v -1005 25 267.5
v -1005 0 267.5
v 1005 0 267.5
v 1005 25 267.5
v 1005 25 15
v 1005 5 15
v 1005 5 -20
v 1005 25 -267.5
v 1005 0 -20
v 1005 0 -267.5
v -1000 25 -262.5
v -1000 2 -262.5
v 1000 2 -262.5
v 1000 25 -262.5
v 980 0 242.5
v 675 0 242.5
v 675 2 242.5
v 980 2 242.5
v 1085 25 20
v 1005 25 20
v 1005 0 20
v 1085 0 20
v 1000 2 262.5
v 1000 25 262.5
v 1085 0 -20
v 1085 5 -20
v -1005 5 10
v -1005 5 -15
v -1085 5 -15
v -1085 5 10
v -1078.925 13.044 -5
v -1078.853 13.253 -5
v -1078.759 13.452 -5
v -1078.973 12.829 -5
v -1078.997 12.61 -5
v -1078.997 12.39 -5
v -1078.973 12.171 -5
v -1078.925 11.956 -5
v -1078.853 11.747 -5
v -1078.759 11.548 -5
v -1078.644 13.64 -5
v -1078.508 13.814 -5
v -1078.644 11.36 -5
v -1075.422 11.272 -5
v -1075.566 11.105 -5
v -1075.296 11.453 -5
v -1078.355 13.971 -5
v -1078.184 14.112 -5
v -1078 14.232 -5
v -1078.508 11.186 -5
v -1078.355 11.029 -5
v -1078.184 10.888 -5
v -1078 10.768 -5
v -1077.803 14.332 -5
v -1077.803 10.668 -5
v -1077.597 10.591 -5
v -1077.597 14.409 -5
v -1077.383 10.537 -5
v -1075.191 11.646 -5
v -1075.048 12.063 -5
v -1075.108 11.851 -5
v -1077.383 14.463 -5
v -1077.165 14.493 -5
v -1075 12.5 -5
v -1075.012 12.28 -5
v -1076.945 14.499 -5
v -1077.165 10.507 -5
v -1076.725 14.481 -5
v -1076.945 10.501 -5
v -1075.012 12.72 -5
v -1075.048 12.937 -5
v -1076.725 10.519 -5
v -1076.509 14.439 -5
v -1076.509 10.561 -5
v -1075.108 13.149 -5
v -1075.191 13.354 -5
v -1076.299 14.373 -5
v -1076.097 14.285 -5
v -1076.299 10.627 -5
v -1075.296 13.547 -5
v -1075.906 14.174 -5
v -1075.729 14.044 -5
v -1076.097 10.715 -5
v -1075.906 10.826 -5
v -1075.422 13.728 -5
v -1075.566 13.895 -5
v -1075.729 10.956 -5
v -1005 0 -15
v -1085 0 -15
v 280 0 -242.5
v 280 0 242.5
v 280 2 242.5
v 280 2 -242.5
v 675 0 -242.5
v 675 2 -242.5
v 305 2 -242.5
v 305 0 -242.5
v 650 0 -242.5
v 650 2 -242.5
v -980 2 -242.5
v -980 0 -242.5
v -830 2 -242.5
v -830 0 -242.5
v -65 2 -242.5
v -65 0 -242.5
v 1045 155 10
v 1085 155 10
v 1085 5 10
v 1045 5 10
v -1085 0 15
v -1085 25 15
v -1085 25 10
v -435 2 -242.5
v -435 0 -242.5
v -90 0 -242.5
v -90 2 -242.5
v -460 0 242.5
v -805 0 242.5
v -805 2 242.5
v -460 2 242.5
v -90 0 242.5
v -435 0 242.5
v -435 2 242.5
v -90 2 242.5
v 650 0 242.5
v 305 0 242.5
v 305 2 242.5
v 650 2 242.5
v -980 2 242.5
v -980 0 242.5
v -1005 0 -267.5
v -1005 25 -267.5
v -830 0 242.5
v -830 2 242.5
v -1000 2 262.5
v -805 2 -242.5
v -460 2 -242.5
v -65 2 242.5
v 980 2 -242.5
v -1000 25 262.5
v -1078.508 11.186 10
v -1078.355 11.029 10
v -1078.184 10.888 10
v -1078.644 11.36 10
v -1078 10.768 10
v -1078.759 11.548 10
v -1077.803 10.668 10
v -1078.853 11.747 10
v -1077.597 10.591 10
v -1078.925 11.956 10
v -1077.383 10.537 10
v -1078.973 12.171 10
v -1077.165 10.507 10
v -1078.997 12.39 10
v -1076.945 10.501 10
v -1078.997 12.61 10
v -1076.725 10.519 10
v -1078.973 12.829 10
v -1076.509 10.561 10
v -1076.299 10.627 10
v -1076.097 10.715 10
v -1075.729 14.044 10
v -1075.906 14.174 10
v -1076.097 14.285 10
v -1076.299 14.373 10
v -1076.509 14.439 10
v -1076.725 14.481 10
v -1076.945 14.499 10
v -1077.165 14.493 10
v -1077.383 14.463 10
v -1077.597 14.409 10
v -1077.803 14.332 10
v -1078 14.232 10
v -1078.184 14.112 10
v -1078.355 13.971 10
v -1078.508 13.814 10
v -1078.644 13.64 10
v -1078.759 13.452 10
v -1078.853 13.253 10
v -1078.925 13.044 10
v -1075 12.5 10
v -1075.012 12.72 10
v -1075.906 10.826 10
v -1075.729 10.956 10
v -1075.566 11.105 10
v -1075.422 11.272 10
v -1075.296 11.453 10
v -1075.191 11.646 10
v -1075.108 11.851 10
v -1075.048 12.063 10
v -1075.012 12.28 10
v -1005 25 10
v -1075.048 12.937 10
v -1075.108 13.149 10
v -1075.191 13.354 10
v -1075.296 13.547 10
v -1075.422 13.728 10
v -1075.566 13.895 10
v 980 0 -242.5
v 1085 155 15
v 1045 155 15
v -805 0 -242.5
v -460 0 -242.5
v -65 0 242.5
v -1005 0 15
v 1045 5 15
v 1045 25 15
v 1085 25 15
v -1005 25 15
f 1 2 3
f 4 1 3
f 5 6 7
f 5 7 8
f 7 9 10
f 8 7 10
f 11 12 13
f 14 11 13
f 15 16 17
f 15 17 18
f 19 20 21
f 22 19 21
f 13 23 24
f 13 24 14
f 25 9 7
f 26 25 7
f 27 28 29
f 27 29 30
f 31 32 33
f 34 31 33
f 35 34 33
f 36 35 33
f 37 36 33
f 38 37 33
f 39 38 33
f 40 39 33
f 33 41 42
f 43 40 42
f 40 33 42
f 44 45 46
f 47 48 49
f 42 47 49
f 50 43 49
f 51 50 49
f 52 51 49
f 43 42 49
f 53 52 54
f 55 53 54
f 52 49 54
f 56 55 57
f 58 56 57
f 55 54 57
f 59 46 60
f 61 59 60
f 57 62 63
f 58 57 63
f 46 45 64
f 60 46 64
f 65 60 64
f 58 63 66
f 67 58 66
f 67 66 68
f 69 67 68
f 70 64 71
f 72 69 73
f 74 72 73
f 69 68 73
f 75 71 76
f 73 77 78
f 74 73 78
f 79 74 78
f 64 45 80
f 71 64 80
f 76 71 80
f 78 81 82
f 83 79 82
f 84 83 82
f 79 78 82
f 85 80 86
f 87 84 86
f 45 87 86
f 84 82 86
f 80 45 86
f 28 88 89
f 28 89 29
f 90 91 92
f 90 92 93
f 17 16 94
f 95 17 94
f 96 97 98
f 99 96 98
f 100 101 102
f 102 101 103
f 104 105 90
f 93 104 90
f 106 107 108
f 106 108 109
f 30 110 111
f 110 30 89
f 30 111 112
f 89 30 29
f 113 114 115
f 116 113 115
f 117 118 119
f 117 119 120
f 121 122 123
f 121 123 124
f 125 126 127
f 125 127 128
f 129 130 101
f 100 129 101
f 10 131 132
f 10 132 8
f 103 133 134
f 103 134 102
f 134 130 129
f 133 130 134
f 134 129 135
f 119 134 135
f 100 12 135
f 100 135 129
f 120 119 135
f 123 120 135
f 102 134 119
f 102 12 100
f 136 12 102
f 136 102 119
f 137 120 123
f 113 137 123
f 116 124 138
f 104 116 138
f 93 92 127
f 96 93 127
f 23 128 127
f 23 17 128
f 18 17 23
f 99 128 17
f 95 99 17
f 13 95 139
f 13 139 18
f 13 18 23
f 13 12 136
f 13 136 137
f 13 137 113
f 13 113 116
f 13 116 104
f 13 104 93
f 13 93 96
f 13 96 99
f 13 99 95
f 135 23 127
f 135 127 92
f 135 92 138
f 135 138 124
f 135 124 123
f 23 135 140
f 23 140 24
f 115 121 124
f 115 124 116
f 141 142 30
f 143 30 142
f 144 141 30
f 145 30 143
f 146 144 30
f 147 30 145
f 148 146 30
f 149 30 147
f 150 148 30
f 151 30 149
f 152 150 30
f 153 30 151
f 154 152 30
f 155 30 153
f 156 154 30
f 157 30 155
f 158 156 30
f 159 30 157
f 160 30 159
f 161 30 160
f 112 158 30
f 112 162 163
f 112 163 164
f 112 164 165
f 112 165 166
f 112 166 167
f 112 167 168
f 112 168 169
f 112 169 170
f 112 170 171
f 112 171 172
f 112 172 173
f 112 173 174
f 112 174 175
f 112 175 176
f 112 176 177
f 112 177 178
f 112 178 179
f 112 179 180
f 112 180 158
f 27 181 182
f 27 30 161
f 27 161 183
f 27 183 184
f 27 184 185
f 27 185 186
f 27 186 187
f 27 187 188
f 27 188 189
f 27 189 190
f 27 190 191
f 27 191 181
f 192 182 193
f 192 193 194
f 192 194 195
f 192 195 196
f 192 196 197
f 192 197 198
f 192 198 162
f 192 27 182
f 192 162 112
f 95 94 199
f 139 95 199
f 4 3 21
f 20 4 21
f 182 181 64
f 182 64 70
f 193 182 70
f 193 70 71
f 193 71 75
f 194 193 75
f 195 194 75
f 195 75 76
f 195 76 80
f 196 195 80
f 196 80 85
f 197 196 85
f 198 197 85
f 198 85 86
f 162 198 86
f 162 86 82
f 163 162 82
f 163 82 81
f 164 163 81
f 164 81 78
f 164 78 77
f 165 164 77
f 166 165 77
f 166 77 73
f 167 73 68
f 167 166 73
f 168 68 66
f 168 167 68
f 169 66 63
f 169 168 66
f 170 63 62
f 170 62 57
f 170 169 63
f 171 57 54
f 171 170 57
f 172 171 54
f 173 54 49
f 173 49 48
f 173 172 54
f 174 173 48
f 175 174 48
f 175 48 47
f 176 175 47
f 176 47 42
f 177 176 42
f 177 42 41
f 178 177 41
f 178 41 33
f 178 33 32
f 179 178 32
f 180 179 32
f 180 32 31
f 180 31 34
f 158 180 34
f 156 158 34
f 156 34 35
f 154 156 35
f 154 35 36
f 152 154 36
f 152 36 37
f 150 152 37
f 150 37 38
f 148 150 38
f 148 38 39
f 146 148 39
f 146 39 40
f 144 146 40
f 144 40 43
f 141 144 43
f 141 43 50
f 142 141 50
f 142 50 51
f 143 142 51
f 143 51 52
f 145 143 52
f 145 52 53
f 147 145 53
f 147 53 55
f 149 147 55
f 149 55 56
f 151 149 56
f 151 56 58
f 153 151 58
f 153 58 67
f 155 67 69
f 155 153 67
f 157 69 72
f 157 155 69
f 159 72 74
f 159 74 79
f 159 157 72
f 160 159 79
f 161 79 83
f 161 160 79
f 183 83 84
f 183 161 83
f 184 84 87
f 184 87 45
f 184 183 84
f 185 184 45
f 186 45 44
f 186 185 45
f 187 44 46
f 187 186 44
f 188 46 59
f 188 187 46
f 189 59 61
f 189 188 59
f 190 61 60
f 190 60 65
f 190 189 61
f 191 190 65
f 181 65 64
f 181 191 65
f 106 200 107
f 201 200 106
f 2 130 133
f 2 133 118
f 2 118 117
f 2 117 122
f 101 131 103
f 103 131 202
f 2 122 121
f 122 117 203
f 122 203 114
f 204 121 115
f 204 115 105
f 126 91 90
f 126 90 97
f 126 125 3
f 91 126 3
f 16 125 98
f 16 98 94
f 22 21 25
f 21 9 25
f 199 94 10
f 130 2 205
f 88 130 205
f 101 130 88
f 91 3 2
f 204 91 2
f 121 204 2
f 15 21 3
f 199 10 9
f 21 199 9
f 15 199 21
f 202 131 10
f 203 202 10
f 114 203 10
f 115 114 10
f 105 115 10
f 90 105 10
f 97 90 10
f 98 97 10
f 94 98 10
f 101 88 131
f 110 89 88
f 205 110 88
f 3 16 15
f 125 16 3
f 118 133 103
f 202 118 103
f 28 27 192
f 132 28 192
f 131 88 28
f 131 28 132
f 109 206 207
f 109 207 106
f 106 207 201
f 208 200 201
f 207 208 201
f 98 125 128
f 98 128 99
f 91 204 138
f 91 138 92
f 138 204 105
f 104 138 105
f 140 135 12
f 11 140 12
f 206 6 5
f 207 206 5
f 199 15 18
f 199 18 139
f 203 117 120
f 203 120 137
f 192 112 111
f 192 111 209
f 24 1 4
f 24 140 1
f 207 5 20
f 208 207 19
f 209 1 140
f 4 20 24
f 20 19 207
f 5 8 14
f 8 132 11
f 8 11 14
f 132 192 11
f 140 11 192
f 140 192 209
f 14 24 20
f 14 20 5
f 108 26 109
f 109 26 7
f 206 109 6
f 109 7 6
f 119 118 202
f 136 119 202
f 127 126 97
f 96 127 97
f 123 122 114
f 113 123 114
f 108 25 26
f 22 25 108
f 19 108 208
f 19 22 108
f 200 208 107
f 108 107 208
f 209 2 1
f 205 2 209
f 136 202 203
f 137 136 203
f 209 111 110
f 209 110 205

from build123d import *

# Parameters (mm, degrees)
SKETCH1_W           = 150
SKETCH1_H           = 485
SKETCH1_W_2         = 345
SKETCH1_W_3         = 305
BOSS_EXTRUDE1_DEPTH = 2
SKETCH2_W           = 2010
SKETCH2_H           = 535
SKETCH2_W_2         = 2000
SKETCH2_H_2         = 525
BOSS_EXTRUDE2_DEPTH = 25
BOSS_EXTRUDE3_DEPTH = 80
SKETCH4_W           = 40
SKETCH4_H           = 150
BOSS_EXTRUDE4_DEPTH = 5
BOSS_EXTRUDE5_DEPTH = 80
SKETCH8_R           = 2
BOSS_EXTRUDE7_DEPTH = 20


with BuildPart() as part:
    # Sketch1 → Boss-Extrude1 (new body)
    with BuildSketch(Plane(origin=(0, 0, 0), x_dir=(1, 0, 0), z_dir=(0, 1, 0))):
        Polygon((1000, -262.5), (1000, 242.5), (1000, 262.5), (-1000, 262.5), (-1000, -262.5), align=None)
        with Locations((-905, 0)):
            Rectangle(SKETCH1_W, SKETCH1_H, mode=Mode.SUBTRACT)
        with Locations((-632.5, 0)):
            Rectangle(SKETCH1_W_2, SKETCH1_H, mode=Mode.SUBTRACT)
        with Locations((-262.5, 0)):
            Rectangle(SKETCH1_W_2, SKETCH1_H, mode=Mode.SUBTRACT)
        with Locations((107.5, 0)):
            Rectangle(SKETCH1_W_2, SKETCH1_H, mode=Mode.SUBTRACT)
        with Locations((827.5, 0)):
            Rectangle(SKETCH1_W_3, SKETCH1_H, mode=Mode.SUBTRACT)
        with Locations((477.5, 0)):
            Rectangle(SKETCH1_W_2, SKETCH1_H, mode=Mode.SUBTRACT)
    extrude(amount=BOSS_EXTRUDE1_DEPTH)

    # Sketch2 → Boss-Extrude2 (add)
    with BuildSketch(Plane(origin=(0, 0, 0), x_dir=(1, 0, 0), z_dir=(0, 1, 0))):
        Rectangle(SKETCH2_W, SKETCH2_H)
        Rectangle(SKETCH2_W_2, SKETCH2_H_2, mode=Mode.SUBTRACT)
    extrude(amount=BOSS_EXTRUDE2_DEPTH)

    # Sketch3 → Boss-Extrude3 (add)
    with BuildSketch(Plane(origin=(1005, 0, 0), x_dir=(0, 0, -1), z_dir=(1, 0, 0))):
        Polygon((-20, 25), (-20, 0), (20, 0), (20, 5), (-15, 5), (-15, 25), align=None)
    extrude(amount=BOSS_EXTRUDE3_DEPTH)

    # Sketch4 → Boss-Extrude4 (add)
    with BuildSketch(Plane(origin=(0, 0, 15), x_dir=(-1, 0, 0), z_dir=(0, 0, -1))):
        with Locations((-1065, 80)):
            Rectangle(SKETCH4_W, SKETCH4_H)
    extrude(amount=BOSS_EXTRUDE4_DEPTH)

    # Sketch5 → Boss-Extrude5 (add)
    with BuildSketch(Plane.ZY.offset(1005)):
        Polygon((15, 25), (15, 0), (-15, 0), (-15, 5), (10, 5), (10, 25), align=None)
    extrude(amount=BOSS_EXTRUDE5_DEPTH)

    # Sketch8 → Boss-Extrude7 (add)
    with BuildSketch(Plane.XY.offset(15)):
        with Locations((-1077, 12.5)):
            Circle(SKETCH8_R)
    extrude(amount=-BOSS_EXTRUDE7_DEPTH)


solid = part.part
